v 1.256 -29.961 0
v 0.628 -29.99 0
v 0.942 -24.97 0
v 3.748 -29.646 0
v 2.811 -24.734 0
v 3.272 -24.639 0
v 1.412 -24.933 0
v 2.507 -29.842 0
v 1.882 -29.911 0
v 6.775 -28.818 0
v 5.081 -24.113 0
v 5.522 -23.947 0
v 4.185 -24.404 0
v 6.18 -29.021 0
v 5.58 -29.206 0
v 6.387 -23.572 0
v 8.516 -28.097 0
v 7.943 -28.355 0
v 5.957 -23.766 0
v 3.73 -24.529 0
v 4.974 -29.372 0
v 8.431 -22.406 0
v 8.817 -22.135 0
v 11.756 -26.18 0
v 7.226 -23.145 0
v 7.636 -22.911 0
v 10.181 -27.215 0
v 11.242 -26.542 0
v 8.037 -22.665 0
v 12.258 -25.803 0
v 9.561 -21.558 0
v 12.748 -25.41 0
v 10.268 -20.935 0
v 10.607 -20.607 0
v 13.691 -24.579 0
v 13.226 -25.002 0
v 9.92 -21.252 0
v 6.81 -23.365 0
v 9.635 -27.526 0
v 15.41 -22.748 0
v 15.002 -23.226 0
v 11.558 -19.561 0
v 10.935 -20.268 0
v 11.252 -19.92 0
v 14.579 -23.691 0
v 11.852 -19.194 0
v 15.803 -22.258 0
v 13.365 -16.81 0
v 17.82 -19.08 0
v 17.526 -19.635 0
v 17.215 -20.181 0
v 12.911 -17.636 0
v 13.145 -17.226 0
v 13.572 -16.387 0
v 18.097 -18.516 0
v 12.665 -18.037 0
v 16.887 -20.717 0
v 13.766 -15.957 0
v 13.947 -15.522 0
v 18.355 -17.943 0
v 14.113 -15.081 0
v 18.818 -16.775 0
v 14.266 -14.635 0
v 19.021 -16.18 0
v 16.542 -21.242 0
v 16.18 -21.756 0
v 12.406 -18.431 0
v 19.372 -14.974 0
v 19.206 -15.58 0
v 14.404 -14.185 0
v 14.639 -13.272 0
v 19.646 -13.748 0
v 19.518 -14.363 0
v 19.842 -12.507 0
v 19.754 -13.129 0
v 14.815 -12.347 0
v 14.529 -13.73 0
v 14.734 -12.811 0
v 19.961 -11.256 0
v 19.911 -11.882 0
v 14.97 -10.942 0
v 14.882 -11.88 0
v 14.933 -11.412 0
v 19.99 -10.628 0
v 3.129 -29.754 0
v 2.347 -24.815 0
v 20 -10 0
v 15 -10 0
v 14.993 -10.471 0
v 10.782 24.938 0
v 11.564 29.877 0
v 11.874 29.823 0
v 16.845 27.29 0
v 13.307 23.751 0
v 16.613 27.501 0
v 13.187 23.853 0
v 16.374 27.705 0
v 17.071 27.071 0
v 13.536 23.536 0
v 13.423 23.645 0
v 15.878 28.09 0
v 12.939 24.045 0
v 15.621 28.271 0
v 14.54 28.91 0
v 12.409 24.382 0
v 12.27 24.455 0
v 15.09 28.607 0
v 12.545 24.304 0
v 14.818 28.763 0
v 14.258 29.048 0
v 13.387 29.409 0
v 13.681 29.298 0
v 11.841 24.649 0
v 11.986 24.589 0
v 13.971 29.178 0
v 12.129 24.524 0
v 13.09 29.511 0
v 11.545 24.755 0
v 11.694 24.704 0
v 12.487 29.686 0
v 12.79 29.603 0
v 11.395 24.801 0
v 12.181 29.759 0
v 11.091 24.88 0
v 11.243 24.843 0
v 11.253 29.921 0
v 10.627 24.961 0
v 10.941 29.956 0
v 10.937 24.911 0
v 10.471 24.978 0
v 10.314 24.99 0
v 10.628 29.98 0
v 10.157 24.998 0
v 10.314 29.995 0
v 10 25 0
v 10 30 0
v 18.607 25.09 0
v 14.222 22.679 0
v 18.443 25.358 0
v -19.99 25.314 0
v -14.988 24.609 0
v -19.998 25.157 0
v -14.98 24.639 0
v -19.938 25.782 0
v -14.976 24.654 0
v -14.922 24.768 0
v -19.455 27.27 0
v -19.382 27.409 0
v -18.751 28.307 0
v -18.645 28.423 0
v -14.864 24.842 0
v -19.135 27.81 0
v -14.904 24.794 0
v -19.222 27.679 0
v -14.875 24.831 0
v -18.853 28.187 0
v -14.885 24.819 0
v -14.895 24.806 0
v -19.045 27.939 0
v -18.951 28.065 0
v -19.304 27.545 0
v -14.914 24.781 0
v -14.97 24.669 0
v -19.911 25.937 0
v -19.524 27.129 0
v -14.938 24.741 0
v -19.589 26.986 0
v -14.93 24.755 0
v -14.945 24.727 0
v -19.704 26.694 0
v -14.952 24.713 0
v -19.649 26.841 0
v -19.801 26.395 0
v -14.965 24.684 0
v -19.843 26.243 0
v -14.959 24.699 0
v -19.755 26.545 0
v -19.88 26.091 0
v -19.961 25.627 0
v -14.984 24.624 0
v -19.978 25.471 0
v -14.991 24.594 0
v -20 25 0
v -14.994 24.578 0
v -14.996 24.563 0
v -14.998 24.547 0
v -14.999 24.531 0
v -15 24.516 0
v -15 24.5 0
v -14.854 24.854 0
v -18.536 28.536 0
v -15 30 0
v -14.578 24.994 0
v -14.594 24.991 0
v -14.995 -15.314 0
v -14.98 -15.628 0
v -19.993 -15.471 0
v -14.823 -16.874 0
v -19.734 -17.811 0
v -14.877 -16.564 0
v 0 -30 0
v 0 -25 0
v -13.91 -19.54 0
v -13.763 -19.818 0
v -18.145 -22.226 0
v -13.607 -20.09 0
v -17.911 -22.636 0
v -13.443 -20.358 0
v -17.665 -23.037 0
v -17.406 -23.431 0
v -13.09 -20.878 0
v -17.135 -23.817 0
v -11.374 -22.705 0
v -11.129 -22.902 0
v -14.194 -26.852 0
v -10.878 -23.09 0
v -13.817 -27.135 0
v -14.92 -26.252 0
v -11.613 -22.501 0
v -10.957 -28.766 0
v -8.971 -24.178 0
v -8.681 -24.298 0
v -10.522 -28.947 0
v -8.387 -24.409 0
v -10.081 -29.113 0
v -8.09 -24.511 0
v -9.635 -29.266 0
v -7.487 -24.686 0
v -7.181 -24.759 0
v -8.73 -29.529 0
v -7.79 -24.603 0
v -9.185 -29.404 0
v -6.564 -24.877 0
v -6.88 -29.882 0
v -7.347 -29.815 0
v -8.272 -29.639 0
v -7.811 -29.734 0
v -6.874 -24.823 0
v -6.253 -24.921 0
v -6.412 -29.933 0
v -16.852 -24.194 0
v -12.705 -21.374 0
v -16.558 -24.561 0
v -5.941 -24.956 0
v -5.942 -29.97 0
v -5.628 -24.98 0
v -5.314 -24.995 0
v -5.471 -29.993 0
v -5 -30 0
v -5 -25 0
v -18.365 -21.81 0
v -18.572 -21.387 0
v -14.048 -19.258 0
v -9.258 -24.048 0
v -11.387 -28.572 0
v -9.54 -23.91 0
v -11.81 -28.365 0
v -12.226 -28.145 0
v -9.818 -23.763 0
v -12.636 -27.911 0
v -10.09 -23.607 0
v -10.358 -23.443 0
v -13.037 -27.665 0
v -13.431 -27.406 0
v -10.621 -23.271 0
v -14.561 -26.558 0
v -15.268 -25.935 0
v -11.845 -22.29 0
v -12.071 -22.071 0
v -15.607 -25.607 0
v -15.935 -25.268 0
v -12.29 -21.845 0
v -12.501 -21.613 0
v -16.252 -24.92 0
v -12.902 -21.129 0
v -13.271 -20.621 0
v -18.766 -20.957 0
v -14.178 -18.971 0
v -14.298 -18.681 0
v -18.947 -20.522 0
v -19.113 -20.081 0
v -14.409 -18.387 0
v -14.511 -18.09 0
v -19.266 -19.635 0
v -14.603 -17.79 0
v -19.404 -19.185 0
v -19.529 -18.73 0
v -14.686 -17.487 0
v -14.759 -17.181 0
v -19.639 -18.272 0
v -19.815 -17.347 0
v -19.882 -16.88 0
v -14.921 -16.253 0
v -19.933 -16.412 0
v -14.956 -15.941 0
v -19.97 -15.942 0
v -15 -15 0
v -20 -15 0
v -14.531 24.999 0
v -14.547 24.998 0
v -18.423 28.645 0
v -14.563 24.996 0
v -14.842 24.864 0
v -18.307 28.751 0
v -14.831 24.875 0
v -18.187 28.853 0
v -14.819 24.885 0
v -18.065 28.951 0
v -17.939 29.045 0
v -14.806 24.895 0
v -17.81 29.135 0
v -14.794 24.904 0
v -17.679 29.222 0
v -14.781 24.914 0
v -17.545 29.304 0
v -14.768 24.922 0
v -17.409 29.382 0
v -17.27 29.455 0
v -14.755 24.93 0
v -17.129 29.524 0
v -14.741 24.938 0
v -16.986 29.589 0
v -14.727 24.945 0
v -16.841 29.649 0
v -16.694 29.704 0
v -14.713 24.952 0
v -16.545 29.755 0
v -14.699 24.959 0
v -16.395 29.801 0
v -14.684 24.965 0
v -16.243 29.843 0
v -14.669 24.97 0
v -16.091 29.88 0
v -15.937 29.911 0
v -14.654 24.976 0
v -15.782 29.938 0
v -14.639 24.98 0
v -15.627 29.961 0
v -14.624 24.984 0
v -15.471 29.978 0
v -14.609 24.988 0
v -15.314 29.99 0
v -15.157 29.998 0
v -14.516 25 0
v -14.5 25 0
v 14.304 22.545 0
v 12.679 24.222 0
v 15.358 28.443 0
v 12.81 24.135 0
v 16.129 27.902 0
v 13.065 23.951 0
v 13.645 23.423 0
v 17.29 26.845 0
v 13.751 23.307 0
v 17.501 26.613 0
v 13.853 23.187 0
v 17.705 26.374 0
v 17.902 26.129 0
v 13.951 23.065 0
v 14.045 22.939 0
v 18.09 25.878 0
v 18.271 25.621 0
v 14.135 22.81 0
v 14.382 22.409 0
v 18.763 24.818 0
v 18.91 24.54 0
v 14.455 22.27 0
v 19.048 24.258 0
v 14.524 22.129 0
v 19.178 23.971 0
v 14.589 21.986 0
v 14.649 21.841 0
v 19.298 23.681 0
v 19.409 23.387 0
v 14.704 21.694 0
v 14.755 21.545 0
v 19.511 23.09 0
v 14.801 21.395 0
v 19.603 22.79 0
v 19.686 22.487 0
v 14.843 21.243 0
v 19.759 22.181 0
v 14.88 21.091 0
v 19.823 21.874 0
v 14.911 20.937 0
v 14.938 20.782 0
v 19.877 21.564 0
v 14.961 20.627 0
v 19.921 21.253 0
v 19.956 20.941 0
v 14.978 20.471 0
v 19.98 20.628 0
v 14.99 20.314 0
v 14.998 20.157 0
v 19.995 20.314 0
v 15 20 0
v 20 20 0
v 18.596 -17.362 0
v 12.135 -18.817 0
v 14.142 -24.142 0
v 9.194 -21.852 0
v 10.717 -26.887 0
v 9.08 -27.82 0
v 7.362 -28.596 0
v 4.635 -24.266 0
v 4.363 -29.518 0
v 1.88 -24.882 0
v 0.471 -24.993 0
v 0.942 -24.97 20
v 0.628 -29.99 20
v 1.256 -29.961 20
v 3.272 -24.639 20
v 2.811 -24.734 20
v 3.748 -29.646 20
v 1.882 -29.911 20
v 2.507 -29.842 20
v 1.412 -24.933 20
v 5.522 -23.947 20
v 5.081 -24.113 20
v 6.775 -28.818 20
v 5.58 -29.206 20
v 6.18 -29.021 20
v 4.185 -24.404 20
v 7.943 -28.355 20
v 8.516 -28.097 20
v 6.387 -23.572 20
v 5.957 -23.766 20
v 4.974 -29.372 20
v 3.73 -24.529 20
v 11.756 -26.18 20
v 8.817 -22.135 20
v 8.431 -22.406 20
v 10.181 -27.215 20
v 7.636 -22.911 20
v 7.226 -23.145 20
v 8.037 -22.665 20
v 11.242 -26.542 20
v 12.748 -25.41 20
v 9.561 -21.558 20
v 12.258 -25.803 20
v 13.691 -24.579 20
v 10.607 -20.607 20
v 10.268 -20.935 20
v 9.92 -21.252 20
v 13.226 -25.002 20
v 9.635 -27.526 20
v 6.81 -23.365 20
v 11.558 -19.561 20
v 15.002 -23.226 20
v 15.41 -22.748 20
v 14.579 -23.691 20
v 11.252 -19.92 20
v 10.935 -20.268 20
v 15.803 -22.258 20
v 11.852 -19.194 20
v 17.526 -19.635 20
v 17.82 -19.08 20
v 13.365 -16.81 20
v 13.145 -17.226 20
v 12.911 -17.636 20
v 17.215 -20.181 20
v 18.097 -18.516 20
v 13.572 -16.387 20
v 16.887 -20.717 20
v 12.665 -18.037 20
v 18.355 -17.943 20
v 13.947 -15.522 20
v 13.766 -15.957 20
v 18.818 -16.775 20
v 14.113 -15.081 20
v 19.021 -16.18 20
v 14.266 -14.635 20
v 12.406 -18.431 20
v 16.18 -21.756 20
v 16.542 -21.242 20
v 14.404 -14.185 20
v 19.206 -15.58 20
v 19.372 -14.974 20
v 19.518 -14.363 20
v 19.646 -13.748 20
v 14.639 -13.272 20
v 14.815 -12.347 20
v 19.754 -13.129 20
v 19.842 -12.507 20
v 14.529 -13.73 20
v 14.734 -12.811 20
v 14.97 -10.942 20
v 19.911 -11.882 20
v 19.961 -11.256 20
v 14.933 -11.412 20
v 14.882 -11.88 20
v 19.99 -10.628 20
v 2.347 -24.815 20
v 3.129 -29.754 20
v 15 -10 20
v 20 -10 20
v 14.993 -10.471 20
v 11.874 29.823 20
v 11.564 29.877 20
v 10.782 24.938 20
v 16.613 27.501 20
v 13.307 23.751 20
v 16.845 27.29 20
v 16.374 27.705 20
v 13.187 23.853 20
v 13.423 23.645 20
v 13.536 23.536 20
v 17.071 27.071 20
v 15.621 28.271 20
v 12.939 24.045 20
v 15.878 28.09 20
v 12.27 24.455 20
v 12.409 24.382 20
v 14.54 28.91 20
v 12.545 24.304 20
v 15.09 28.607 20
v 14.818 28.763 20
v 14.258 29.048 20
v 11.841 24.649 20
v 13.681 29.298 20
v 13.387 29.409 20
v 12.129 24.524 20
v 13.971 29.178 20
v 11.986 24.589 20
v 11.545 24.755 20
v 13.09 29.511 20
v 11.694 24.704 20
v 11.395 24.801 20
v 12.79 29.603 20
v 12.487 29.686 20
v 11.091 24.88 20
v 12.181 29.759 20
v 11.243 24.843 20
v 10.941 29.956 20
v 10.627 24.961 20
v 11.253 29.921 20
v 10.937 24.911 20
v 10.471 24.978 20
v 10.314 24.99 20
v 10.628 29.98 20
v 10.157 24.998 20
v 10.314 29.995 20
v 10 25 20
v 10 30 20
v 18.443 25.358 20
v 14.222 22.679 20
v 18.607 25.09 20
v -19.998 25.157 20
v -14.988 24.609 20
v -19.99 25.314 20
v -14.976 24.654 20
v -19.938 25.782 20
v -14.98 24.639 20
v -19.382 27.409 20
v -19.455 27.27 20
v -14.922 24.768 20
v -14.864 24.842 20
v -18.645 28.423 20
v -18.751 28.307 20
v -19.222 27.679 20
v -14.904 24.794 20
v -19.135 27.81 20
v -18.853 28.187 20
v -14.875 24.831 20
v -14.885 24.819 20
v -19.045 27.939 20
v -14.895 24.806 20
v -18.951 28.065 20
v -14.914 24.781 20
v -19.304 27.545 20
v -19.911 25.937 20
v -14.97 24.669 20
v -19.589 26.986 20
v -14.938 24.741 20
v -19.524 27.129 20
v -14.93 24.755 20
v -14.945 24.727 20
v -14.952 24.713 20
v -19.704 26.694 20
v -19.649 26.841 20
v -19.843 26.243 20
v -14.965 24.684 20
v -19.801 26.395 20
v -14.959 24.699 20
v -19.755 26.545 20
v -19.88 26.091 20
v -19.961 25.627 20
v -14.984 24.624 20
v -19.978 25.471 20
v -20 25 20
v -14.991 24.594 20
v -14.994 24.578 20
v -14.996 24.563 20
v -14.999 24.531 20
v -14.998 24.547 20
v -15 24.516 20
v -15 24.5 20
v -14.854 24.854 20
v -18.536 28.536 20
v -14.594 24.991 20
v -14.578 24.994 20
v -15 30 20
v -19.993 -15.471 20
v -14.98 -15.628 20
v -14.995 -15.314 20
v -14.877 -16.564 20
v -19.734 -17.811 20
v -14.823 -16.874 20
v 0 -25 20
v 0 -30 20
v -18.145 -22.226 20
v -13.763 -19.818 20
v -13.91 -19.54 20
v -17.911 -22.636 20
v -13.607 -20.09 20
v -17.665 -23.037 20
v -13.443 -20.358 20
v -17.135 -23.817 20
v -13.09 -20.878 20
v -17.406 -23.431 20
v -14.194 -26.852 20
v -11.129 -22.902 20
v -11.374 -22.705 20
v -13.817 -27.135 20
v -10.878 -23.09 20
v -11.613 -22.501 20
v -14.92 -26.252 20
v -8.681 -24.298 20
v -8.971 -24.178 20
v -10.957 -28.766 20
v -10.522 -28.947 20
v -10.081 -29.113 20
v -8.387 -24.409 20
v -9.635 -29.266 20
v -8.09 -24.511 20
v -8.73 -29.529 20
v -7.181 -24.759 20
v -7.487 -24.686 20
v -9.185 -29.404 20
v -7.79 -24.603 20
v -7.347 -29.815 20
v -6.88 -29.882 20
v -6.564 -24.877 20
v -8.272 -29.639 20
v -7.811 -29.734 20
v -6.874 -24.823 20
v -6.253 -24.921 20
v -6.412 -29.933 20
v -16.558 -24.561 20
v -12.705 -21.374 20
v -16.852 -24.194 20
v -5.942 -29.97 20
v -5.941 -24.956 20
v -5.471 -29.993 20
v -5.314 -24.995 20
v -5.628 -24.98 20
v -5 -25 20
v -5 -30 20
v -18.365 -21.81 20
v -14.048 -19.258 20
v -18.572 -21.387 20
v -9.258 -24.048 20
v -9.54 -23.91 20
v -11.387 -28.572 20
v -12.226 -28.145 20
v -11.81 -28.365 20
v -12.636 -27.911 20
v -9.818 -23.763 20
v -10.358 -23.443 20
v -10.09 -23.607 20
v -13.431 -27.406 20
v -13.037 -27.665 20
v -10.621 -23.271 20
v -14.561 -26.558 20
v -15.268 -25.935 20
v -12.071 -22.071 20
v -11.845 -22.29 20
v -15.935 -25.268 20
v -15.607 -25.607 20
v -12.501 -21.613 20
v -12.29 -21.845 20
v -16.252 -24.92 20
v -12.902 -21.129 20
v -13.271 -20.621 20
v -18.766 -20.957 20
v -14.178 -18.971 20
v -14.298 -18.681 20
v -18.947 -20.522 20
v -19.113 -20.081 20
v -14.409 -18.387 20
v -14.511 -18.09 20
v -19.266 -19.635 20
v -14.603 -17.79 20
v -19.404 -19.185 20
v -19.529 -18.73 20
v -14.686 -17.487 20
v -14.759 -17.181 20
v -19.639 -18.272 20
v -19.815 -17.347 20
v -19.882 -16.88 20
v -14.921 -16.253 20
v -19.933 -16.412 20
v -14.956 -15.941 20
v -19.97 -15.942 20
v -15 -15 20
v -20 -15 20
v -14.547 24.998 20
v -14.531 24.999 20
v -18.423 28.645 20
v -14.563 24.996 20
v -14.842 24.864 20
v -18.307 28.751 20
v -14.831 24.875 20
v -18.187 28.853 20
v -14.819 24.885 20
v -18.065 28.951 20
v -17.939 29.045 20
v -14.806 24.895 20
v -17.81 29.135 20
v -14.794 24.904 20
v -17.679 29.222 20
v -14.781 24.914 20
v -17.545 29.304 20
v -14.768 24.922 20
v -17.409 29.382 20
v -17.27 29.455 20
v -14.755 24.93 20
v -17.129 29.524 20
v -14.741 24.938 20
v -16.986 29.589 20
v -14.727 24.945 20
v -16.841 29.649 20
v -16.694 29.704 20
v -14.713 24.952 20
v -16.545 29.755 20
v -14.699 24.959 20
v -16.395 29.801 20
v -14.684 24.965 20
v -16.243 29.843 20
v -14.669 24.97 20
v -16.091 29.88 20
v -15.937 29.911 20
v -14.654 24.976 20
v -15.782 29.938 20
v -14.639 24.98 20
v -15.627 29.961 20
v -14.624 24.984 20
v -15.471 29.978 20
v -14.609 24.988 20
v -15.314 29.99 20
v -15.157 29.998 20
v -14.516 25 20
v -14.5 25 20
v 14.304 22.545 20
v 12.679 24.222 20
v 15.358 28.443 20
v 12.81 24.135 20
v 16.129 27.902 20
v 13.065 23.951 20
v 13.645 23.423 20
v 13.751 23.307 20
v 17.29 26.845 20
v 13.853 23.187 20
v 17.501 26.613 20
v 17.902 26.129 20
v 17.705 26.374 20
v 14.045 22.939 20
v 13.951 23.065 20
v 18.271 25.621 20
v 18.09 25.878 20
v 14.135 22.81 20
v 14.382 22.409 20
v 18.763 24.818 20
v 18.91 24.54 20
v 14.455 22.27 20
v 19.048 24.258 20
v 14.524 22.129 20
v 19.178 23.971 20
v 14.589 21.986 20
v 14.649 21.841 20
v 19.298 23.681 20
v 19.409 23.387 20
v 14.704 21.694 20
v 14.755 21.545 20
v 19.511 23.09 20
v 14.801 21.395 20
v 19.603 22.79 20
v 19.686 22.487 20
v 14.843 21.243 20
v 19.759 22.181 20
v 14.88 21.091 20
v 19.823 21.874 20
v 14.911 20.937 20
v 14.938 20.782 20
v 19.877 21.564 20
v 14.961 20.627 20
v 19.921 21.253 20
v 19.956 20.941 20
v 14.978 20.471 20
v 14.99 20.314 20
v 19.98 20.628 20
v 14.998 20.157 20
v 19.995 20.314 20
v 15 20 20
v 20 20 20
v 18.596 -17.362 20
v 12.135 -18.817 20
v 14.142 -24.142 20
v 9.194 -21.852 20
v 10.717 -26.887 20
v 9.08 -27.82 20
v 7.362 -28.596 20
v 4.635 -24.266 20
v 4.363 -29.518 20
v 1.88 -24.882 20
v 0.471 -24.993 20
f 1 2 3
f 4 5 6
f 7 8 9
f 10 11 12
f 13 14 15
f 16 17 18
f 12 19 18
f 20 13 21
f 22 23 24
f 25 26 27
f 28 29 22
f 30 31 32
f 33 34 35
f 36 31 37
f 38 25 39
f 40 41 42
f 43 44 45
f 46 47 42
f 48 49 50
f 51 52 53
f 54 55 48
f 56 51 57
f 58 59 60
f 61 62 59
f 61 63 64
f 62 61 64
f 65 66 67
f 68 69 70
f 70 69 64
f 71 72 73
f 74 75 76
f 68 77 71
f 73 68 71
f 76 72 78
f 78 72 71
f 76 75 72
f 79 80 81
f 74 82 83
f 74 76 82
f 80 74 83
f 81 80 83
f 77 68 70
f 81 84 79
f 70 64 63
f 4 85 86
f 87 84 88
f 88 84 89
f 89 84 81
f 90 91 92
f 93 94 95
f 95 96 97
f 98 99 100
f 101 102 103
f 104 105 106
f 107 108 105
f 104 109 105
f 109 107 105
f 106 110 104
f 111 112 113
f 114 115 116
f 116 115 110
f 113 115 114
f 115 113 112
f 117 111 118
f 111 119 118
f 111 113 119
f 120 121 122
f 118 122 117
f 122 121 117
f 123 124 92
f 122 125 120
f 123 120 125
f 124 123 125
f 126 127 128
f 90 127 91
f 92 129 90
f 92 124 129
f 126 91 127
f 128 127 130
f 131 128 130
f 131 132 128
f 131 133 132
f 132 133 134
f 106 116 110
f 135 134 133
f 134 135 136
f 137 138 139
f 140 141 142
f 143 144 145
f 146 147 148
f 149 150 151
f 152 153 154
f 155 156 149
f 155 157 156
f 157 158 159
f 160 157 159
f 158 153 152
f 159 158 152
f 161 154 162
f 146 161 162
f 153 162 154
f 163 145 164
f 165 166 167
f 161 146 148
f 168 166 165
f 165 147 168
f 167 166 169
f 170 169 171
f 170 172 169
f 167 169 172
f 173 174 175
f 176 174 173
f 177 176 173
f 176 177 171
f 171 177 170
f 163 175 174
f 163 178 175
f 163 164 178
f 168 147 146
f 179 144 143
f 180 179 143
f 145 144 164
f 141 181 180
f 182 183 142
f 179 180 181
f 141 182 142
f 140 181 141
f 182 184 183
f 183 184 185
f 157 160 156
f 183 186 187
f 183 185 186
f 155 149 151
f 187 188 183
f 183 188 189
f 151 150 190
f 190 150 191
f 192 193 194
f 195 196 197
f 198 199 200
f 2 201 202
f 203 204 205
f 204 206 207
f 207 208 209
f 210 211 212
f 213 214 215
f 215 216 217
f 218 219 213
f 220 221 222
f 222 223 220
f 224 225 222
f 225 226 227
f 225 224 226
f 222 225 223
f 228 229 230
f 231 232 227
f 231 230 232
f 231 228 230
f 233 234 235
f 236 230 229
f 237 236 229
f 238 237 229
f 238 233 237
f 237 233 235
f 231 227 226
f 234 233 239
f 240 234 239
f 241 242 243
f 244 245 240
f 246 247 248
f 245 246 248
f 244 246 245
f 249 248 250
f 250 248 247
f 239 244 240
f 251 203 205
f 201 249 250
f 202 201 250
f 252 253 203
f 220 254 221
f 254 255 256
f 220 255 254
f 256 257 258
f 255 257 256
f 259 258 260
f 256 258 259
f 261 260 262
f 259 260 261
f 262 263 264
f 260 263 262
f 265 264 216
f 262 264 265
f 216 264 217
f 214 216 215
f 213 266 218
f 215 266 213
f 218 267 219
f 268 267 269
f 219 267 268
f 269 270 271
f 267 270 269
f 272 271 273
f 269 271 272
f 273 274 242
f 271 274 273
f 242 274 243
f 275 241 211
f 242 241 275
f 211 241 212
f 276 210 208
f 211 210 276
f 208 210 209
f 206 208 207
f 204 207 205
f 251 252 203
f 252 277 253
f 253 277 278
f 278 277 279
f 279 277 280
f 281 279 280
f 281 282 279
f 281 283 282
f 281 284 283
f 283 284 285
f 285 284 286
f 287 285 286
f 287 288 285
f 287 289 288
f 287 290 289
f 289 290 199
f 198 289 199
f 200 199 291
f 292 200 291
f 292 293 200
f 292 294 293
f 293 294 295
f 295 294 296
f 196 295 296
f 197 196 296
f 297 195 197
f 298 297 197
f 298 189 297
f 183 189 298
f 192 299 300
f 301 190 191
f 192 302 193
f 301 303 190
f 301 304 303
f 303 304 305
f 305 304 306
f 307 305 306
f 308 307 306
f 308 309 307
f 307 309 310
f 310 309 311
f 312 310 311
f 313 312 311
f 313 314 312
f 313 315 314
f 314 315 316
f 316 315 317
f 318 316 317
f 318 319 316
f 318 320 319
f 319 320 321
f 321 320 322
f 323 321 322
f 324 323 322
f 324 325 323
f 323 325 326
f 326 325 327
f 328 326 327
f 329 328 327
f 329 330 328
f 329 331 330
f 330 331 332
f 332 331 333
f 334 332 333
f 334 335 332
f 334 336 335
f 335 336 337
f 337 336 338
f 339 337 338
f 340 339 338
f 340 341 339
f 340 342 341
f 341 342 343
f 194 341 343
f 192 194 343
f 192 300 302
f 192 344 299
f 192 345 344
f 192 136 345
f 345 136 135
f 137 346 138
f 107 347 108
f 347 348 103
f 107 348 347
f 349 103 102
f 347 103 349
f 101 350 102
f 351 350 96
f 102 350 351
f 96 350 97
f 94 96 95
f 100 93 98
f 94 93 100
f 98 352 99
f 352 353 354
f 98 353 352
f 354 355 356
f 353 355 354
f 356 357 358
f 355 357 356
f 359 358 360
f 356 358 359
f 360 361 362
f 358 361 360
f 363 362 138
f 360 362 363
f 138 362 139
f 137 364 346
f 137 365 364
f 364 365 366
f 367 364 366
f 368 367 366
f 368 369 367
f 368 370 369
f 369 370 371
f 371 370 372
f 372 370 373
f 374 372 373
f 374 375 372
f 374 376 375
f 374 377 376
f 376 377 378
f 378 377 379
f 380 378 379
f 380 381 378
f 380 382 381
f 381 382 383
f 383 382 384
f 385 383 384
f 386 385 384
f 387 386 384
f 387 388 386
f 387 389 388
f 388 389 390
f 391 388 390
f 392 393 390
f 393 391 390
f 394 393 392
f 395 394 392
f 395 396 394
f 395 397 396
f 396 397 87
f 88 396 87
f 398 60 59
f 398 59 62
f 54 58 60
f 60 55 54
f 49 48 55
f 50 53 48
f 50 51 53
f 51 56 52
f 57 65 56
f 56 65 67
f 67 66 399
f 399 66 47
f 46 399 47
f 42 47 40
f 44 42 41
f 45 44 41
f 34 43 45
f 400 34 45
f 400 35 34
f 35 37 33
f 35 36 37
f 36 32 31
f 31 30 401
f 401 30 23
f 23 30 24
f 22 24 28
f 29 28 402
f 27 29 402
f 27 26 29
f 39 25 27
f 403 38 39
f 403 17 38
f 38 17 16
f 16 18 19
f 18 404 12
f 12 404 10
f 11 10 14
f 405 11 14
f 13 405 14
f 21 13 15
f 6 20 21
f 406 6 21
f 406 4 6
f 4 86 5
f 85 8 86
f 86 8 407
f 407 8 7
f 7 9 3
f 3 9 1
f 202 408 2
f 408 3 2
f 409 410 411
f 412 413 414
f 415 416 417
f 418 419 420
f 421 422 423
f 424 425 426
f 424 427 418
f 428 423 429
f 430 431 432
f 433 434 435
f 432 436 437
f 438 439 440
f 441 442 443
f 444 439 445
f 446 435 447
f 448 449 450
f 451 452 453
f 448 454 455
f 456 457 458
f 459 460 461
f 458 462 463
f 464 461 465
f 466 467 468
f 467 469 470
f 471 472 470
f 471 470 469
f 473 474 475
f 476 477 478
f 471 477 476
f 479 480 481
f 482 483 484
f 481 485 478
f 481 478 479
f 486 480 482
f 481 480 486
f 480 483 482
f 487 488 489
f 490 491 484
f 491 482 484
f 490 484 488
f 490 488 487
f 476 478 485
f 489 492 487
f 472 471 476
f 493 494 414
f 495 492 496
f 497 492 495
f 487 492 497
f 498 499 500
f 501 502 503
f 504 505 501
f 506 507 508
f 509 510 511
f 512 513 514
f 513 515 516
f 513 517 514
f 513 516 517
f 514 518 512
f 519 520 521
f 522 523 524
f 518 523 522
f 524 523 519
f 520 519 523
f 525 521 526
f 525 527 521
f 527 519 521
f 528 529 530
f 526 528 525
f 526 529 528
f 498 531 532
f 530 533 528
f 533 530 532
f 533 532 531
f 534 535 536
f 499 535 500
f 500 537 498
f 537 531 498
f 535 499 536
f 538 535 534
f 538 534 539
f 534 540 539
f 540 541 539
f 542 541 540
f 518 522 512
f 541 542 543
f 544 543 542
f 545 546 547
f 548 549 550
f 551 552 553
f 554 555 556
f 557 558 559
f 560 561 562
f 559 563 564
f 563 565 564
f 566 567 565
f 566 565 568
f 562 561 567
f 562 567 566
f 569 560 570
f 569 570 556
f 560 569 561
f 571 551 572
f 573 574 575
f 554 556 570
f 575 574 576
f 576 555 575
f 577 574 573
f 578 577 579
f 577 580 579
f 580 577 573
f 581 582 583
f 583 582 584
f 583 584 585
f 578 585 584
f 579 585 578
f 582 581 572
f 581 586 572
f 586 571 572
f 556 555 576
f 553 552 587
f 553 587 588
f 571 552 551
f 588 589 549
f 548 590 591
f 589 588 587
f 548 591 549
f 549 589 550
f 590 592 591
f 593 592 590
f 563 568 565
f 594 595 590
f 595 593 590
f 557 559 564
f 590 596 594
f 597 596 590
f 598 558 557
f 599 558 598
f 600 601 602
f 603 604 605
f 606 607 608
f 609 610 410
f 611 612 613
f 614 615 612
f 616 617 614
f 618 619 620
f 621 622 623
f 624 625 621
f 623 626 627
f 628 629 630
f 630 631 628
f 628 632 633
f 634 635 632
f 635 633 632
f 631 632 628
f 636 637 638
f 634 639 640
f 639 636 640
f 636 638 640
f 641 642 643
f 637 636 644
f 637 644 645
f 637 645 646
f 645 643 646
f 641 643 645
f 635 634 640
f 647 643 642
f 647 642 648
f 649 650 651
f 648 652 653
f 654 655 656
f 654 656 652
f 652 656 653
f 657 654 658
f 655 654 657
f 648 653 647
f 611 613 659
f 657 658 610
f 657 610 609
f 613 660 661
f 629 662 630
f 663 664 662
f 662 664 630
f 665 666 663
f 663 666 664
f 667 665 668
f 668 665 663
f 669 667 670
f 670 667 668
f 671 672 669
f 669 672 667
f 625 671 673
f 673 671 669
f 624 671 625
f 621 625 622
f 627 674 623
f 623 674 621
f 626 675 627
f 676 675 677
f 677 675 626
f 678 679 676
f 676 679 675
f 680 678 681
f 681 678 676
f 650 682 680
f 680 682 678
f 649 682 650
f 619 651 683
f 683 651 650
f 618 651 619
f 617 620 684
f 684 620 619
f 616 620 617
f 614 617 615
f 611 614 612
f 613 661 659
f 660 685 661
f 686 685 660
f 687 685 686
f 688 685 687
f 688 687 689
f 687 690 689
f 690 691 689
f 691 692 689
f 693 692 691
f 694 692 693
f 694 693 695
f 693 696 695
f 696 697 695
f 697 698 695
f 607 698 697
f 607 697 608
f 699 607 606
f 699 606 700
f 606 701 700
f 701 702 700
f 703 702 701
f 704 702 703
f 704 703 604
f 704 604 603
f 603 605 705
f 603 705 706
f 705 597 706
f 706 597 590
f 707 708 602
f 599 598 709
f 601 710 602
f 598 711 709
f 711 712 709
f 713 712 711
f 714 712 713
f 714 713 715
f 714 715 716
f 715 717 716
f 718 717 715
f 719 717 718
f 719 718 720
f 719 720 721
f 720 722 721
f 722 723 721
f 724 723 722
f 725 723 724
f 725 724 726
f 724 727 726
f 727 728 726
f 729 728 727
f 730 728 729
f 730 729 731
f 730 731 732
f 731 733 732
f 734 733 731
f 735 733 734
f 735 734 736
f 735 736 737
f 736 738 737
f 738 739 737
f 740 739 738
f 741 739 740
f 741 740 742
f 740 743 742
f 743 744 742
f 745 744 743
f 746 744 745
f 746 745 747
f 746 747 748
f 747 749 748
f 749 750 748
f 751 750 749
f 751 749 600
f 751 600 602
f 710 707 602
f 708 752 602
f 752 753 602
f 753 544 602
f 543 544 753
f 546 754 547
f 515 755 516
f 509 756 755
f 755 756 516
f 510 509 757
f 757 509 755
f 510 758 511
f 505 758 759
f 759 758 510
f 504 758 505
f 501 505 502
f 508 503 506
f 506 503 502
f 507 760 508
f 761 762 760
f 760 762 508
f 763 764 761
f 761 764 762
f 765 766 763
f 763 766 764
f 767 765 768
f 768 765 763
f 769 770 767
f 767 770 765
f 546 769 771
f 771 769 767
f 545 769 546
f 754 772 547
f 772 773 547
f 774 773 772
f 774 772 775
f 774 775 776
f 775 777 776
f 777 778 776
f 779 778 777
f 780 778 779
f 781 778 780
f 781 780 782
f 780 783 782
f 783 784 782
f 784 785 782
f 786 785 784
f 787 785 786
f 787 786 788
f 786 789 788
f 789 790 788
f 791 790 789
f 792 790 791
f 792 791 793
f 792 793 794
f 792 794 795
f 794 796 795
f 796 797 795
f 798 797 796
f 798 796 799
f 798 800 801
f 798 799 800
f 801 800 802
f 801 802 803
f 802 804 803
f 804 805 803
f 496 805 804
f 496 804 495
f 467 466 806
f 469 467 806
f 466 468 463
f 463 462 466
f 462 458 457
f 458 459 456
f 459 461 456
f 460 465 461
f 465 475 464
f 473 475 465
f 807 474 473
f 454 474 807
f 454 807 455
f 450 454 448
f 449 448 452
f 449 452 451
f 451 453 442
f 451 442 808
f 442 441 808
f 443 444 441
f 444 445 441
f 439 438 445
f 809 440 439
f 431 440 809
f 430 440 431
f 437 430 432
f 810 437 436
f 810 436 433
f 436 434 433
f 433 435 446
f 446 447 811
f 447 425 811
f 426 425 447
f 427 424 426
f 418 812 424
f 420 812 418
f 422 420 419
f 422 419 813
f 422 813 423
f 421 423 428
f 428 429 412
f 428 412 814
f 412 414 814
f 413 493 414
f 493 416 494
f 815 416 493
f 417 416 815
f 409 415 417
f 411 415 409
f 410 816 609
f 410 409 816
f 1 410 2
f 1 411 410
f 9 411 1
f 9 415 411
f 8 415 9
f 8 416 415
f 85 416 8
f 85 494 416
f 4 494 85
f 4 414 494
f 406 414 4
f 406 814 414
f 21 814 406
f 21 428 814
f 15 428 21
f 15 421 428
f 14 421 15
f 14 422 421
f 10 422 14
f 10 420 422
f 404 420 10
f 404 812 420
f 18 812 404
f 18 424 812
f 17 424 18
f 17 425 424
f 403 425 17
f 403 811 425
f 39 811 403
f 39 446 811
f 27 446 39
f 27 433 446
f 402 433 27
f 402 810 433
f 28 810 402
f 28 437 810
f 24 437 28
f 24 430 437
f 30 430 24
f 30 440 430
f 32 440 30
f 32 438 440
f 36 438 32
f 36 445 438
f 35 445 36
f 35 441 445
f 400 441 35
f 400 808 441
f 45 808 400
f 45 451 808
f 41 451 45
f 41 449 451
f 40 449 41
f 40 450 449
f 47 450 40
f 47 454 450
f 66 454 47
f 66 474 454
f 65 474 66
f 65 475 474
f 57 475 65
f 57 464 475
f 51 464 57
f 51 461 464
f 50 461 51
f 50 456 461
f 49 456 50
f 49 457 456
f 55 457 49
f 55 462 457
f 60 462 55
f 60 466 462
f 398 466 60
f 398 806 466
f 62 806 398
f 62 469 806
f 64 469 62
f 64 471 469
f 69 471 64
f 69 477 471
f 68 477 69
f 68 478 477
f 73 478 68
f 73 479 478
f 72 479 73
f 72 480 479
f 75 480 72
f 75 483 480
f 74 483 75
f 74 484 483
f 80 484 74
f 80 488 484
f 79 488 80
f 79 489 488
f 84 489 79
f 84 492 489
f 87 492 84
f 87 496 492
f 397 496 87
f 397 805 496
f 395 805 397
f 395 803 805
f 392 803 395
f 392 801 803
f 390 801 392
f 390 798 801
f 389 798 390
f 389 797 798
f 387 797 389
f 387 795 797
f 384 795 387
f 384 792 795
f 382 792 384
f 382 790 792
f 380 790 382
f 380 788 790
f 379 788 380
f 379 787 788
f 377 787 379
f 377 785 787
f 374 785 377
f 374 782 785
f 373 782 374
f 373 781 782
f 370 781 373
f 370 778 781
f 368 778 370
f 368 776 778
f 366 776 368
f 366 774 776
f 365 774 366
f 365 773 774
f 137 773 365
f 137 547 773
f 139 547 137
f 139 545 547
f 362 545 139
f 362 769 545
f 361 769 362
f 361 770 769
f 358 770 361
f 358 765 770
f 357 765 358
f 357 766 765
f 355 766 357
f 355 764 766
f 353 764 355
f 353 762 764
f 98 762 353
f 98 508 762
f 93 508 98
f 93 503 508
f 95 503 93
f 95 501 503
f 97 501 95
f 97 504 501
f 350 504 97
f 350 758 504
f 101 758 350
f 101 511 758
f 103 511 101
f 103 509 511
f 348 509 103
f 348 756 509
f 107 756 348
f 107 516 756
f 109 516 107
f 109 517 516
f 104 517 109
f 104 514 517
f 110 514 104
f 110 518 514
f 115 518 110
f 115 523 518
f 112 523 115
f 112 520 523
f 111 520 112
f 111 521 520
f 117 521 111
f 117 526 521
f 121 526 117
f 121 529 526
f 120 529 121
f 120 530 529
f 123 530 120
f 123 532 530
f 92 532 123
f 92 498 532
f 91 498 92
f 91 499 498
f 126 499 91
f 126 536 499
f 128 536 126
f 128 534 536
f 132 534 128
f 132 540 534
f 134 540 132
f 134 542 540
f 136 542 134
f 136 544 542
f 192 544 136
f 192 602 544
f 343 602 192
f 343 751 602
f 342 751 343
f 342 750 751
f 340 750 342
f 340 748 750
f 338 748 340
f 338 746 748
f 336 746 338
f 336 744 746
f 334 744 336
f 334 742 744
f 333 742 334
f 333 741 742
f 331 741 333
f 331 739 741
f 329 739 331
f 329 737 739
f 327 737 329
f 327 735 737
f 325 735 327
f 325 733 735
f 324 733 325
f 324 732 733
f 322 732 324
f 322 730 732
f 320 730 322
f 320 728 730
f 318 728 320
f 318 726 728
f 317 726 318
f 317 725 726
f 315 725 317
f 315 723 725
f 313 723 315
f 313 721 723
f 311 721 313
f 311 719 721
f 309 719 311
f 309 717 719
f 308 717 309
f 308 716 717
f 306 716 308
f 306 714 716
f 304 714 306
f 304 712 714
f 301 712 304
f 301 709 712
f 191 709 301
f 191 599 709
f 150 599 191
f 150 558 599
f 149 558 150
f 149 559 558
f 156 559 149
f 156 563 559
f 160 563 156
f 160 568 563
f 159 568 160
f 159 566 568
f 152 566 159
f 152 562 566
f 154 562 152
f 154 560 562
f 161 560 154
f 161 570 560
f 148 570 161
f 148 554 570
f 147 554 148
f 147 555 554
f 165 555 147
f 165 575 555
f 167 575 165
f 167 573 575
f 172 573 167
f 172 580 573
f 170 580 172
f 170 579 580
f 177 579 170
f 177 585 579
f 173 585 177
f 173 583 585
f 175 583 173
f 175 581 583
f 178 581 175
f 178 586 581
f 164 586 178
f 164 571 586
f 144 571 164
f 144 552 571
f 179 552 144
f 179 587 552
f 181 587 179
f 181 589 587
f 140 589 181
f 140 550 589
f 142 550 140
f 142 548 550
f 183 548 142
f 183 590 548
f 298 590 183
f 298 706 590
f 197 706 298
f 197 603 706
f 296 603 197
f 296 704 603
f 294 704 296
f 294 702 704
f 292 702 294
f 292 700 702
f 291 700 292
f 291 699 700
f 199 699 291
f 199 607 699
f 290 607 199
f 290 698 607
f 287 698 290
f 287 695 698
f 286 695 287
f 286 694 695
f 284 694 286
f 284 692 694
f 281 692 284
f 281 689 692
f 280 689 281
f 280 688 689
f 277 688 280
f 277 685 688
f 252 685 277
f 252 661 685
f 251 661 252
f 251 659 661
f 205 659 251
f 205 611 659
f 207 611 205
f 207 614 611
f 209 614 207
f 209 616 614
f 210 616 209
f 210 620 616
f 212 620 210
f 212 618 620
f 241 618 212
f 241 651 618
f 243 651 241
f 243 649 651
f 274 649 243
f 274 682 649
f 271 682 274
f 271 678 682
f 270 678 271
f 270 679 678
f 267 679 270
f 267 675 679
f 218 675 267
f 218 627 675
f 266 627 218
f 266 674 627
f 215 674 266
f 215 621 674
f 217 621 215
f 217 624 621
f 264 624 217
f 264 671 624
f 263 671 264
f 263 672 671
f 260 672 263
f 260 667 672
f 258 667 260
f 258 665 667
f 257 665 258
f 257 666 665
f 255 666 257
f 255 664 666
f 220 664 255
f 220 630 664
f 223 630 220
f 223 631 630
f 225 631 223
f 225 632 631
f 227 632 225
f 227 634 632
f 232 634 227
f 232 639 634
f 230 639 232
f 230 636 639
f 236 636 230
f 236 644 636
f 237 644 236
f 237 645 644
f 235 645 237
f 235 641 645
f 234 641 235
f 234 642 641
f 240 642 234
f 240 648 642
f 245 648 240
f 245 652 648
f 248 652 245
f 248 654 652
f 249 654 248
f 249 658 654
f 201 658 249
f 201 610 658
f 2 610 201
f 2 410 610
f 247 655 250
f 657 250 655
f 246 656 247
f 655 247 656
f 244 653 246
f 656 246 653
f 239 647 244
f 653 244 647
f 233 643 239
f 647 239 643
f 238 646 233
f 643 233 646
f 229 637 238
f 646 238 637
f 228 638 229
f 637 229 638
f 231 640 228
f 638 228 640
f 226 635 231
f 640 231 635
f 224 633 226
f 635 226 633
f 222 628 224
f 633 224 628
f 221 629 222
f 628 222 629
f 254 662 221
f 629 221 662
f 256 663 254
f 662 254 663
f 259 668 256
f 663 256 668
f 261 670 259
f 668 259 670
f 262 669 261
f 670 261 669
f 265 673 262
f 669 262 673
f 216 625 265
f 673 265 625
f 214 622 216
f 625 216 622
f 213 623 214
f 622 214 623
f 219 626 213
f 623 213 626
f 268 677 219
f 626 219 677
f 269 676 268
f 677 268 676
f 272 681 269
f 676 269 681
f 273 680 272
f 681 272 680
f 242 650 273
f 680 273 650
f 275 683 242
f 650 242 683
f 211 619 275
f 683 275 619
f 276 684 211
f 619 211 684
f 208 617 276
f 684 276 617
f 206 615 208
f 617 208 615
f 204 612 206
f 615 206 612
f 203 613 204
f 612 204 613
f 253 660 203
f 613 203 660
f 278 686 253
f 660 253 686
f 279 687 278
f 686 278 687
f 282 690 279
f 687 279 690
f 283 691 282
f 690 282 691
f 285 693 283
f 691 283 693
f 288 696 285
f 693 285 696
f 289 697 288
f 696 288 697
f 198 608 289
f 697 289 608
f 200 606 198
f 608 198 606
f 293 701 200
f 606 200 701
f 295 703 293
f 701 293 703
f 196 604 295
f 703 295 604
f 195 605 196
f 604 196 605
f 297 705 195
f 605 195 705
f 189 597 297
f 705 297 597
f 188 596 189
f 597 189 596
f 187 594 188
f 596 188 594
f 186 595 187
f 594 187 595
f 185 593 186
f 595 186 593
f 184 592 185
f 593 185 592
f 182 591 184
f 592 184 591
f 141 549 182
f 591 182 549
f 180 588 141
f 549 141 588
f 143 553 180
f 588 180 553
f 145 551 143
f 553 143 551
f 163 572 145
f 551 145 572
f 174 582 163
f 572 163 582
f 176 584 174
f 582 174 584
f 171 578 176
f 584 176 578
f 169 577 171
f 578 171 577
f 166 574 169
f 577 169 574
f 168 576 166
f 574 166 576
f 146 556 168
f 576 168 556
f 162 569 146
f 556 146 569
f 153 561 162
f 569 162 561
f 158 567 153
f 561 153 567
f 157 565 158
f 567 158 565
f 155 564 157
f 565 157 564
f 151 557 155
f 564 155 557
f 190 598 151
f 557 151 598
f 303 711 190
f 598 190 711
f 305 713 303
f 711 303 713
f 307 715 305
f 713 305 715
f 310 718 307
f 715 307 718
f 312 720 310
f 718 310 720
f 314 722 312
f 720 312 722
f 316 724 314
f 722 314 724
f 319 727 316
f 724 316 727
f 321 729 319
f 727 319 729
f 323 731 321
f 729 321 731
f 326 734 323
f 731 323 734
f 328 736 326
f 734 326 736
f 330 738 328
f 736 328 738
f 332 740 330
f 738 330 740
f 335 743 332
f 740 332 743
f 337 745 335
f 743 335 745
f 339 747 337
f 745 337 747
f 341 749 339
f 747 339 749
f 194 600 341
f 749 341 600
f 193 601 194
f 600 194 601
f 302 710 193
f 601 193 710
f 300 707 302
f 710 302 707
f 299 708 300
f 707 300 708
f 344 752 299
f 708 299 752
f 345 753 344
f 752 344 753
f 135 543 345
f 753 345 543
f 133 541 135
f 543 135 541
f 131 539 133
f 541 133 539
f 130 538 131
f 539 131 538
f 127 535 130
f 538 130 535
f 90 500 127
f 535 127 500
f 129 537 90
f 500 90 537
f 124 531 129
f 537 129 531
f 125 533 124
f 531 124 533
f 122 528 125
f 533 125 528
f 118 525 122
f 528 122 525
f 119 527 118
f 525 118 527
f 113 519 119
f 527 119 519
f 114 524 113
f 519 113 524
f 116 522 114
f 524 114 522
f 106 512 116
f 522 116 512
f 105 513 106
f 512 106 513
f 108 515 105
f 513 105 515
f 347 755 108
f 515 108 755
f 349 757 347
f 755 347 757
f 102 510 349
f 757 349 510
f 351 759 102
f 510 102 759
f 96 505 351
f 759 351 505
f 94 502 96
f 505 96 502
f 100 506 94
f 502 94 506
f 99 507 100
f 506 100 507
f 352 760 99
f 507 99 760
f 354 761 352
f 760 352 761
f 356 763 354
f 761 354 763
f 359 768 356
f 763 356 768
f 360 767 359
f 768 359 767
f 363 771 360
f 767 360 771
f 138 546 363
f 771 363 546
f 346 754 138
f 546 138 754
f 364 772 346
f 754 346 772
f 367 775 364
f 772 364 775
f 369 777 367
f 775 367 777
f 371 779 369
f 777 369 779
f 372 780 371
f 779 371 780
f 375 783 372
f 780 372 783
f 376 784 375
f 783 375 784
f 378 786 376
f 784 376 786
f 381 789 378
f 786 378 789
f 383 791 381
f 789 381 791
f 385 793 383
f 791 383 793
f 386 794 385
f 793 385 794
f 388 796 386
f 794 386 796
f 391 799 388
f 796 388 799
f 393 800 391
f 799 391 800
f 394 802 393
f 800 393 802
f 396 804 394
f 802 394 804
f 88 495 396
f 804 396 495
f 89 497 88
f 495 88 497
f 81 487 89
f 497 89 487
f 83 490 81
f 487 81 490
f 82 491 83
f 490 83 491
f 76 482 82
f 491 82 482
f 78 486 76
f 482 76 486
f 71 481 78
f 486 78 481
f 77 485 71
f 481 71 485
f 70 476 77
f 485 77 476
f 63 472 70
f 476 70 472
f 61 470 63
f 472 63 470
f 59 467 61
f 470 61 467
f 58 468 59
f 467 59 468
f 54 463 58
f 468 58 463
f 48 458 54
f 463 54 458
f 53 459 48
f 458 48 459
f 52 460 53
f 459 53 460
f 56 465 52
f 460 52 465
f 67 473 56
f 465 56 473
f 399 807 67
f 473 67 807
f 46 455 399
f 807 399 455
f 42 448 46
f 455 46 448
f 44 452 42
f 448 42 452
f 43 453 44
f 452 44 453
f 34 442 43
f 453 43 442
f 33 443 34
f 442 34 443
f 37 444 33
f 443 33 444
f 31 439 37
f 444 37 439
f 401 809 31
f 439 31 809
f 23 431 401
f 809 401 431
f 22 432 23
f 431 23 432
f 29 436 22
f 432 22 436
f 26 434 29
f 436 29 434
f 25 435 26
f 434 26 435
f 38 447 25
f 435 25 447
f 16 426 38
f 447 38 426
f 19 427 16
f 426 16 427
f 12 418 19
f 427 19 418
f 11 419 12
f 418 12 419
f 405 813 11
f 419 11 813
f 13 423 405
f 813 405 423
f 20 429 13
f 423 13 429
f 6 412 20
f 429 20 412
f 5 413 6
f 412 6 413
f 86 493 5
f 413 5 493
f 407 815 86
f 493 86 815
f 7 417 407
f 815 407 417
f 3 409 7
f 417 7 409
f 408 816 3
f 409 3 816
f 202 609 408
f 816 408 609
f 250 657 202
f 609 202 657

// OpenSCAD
$fn = 200;
linear_extrude(height = 20) difference() {
    hull() {
        translate([ -15, 25, 0 ]) circle(d = 10);
        translate([ 10, 20, 0 ]) circle(d = 20);
        translate([ -5, -15, 0 ]) circle(d = 30);
        translate([ 0, -10, 0 ]) circle(d = 40);
    }
    hull() {
        translate([ -14.5, 24.5, 0 ]) circle(d = 1);
        translate([ 10, 20, 0 ]) circle(d = 10);
        translate([ -5, -15, 0 ]) circle(d = 20);
        translate([ 0, -10, 0 ]) circle(d = 30);
    }
}
